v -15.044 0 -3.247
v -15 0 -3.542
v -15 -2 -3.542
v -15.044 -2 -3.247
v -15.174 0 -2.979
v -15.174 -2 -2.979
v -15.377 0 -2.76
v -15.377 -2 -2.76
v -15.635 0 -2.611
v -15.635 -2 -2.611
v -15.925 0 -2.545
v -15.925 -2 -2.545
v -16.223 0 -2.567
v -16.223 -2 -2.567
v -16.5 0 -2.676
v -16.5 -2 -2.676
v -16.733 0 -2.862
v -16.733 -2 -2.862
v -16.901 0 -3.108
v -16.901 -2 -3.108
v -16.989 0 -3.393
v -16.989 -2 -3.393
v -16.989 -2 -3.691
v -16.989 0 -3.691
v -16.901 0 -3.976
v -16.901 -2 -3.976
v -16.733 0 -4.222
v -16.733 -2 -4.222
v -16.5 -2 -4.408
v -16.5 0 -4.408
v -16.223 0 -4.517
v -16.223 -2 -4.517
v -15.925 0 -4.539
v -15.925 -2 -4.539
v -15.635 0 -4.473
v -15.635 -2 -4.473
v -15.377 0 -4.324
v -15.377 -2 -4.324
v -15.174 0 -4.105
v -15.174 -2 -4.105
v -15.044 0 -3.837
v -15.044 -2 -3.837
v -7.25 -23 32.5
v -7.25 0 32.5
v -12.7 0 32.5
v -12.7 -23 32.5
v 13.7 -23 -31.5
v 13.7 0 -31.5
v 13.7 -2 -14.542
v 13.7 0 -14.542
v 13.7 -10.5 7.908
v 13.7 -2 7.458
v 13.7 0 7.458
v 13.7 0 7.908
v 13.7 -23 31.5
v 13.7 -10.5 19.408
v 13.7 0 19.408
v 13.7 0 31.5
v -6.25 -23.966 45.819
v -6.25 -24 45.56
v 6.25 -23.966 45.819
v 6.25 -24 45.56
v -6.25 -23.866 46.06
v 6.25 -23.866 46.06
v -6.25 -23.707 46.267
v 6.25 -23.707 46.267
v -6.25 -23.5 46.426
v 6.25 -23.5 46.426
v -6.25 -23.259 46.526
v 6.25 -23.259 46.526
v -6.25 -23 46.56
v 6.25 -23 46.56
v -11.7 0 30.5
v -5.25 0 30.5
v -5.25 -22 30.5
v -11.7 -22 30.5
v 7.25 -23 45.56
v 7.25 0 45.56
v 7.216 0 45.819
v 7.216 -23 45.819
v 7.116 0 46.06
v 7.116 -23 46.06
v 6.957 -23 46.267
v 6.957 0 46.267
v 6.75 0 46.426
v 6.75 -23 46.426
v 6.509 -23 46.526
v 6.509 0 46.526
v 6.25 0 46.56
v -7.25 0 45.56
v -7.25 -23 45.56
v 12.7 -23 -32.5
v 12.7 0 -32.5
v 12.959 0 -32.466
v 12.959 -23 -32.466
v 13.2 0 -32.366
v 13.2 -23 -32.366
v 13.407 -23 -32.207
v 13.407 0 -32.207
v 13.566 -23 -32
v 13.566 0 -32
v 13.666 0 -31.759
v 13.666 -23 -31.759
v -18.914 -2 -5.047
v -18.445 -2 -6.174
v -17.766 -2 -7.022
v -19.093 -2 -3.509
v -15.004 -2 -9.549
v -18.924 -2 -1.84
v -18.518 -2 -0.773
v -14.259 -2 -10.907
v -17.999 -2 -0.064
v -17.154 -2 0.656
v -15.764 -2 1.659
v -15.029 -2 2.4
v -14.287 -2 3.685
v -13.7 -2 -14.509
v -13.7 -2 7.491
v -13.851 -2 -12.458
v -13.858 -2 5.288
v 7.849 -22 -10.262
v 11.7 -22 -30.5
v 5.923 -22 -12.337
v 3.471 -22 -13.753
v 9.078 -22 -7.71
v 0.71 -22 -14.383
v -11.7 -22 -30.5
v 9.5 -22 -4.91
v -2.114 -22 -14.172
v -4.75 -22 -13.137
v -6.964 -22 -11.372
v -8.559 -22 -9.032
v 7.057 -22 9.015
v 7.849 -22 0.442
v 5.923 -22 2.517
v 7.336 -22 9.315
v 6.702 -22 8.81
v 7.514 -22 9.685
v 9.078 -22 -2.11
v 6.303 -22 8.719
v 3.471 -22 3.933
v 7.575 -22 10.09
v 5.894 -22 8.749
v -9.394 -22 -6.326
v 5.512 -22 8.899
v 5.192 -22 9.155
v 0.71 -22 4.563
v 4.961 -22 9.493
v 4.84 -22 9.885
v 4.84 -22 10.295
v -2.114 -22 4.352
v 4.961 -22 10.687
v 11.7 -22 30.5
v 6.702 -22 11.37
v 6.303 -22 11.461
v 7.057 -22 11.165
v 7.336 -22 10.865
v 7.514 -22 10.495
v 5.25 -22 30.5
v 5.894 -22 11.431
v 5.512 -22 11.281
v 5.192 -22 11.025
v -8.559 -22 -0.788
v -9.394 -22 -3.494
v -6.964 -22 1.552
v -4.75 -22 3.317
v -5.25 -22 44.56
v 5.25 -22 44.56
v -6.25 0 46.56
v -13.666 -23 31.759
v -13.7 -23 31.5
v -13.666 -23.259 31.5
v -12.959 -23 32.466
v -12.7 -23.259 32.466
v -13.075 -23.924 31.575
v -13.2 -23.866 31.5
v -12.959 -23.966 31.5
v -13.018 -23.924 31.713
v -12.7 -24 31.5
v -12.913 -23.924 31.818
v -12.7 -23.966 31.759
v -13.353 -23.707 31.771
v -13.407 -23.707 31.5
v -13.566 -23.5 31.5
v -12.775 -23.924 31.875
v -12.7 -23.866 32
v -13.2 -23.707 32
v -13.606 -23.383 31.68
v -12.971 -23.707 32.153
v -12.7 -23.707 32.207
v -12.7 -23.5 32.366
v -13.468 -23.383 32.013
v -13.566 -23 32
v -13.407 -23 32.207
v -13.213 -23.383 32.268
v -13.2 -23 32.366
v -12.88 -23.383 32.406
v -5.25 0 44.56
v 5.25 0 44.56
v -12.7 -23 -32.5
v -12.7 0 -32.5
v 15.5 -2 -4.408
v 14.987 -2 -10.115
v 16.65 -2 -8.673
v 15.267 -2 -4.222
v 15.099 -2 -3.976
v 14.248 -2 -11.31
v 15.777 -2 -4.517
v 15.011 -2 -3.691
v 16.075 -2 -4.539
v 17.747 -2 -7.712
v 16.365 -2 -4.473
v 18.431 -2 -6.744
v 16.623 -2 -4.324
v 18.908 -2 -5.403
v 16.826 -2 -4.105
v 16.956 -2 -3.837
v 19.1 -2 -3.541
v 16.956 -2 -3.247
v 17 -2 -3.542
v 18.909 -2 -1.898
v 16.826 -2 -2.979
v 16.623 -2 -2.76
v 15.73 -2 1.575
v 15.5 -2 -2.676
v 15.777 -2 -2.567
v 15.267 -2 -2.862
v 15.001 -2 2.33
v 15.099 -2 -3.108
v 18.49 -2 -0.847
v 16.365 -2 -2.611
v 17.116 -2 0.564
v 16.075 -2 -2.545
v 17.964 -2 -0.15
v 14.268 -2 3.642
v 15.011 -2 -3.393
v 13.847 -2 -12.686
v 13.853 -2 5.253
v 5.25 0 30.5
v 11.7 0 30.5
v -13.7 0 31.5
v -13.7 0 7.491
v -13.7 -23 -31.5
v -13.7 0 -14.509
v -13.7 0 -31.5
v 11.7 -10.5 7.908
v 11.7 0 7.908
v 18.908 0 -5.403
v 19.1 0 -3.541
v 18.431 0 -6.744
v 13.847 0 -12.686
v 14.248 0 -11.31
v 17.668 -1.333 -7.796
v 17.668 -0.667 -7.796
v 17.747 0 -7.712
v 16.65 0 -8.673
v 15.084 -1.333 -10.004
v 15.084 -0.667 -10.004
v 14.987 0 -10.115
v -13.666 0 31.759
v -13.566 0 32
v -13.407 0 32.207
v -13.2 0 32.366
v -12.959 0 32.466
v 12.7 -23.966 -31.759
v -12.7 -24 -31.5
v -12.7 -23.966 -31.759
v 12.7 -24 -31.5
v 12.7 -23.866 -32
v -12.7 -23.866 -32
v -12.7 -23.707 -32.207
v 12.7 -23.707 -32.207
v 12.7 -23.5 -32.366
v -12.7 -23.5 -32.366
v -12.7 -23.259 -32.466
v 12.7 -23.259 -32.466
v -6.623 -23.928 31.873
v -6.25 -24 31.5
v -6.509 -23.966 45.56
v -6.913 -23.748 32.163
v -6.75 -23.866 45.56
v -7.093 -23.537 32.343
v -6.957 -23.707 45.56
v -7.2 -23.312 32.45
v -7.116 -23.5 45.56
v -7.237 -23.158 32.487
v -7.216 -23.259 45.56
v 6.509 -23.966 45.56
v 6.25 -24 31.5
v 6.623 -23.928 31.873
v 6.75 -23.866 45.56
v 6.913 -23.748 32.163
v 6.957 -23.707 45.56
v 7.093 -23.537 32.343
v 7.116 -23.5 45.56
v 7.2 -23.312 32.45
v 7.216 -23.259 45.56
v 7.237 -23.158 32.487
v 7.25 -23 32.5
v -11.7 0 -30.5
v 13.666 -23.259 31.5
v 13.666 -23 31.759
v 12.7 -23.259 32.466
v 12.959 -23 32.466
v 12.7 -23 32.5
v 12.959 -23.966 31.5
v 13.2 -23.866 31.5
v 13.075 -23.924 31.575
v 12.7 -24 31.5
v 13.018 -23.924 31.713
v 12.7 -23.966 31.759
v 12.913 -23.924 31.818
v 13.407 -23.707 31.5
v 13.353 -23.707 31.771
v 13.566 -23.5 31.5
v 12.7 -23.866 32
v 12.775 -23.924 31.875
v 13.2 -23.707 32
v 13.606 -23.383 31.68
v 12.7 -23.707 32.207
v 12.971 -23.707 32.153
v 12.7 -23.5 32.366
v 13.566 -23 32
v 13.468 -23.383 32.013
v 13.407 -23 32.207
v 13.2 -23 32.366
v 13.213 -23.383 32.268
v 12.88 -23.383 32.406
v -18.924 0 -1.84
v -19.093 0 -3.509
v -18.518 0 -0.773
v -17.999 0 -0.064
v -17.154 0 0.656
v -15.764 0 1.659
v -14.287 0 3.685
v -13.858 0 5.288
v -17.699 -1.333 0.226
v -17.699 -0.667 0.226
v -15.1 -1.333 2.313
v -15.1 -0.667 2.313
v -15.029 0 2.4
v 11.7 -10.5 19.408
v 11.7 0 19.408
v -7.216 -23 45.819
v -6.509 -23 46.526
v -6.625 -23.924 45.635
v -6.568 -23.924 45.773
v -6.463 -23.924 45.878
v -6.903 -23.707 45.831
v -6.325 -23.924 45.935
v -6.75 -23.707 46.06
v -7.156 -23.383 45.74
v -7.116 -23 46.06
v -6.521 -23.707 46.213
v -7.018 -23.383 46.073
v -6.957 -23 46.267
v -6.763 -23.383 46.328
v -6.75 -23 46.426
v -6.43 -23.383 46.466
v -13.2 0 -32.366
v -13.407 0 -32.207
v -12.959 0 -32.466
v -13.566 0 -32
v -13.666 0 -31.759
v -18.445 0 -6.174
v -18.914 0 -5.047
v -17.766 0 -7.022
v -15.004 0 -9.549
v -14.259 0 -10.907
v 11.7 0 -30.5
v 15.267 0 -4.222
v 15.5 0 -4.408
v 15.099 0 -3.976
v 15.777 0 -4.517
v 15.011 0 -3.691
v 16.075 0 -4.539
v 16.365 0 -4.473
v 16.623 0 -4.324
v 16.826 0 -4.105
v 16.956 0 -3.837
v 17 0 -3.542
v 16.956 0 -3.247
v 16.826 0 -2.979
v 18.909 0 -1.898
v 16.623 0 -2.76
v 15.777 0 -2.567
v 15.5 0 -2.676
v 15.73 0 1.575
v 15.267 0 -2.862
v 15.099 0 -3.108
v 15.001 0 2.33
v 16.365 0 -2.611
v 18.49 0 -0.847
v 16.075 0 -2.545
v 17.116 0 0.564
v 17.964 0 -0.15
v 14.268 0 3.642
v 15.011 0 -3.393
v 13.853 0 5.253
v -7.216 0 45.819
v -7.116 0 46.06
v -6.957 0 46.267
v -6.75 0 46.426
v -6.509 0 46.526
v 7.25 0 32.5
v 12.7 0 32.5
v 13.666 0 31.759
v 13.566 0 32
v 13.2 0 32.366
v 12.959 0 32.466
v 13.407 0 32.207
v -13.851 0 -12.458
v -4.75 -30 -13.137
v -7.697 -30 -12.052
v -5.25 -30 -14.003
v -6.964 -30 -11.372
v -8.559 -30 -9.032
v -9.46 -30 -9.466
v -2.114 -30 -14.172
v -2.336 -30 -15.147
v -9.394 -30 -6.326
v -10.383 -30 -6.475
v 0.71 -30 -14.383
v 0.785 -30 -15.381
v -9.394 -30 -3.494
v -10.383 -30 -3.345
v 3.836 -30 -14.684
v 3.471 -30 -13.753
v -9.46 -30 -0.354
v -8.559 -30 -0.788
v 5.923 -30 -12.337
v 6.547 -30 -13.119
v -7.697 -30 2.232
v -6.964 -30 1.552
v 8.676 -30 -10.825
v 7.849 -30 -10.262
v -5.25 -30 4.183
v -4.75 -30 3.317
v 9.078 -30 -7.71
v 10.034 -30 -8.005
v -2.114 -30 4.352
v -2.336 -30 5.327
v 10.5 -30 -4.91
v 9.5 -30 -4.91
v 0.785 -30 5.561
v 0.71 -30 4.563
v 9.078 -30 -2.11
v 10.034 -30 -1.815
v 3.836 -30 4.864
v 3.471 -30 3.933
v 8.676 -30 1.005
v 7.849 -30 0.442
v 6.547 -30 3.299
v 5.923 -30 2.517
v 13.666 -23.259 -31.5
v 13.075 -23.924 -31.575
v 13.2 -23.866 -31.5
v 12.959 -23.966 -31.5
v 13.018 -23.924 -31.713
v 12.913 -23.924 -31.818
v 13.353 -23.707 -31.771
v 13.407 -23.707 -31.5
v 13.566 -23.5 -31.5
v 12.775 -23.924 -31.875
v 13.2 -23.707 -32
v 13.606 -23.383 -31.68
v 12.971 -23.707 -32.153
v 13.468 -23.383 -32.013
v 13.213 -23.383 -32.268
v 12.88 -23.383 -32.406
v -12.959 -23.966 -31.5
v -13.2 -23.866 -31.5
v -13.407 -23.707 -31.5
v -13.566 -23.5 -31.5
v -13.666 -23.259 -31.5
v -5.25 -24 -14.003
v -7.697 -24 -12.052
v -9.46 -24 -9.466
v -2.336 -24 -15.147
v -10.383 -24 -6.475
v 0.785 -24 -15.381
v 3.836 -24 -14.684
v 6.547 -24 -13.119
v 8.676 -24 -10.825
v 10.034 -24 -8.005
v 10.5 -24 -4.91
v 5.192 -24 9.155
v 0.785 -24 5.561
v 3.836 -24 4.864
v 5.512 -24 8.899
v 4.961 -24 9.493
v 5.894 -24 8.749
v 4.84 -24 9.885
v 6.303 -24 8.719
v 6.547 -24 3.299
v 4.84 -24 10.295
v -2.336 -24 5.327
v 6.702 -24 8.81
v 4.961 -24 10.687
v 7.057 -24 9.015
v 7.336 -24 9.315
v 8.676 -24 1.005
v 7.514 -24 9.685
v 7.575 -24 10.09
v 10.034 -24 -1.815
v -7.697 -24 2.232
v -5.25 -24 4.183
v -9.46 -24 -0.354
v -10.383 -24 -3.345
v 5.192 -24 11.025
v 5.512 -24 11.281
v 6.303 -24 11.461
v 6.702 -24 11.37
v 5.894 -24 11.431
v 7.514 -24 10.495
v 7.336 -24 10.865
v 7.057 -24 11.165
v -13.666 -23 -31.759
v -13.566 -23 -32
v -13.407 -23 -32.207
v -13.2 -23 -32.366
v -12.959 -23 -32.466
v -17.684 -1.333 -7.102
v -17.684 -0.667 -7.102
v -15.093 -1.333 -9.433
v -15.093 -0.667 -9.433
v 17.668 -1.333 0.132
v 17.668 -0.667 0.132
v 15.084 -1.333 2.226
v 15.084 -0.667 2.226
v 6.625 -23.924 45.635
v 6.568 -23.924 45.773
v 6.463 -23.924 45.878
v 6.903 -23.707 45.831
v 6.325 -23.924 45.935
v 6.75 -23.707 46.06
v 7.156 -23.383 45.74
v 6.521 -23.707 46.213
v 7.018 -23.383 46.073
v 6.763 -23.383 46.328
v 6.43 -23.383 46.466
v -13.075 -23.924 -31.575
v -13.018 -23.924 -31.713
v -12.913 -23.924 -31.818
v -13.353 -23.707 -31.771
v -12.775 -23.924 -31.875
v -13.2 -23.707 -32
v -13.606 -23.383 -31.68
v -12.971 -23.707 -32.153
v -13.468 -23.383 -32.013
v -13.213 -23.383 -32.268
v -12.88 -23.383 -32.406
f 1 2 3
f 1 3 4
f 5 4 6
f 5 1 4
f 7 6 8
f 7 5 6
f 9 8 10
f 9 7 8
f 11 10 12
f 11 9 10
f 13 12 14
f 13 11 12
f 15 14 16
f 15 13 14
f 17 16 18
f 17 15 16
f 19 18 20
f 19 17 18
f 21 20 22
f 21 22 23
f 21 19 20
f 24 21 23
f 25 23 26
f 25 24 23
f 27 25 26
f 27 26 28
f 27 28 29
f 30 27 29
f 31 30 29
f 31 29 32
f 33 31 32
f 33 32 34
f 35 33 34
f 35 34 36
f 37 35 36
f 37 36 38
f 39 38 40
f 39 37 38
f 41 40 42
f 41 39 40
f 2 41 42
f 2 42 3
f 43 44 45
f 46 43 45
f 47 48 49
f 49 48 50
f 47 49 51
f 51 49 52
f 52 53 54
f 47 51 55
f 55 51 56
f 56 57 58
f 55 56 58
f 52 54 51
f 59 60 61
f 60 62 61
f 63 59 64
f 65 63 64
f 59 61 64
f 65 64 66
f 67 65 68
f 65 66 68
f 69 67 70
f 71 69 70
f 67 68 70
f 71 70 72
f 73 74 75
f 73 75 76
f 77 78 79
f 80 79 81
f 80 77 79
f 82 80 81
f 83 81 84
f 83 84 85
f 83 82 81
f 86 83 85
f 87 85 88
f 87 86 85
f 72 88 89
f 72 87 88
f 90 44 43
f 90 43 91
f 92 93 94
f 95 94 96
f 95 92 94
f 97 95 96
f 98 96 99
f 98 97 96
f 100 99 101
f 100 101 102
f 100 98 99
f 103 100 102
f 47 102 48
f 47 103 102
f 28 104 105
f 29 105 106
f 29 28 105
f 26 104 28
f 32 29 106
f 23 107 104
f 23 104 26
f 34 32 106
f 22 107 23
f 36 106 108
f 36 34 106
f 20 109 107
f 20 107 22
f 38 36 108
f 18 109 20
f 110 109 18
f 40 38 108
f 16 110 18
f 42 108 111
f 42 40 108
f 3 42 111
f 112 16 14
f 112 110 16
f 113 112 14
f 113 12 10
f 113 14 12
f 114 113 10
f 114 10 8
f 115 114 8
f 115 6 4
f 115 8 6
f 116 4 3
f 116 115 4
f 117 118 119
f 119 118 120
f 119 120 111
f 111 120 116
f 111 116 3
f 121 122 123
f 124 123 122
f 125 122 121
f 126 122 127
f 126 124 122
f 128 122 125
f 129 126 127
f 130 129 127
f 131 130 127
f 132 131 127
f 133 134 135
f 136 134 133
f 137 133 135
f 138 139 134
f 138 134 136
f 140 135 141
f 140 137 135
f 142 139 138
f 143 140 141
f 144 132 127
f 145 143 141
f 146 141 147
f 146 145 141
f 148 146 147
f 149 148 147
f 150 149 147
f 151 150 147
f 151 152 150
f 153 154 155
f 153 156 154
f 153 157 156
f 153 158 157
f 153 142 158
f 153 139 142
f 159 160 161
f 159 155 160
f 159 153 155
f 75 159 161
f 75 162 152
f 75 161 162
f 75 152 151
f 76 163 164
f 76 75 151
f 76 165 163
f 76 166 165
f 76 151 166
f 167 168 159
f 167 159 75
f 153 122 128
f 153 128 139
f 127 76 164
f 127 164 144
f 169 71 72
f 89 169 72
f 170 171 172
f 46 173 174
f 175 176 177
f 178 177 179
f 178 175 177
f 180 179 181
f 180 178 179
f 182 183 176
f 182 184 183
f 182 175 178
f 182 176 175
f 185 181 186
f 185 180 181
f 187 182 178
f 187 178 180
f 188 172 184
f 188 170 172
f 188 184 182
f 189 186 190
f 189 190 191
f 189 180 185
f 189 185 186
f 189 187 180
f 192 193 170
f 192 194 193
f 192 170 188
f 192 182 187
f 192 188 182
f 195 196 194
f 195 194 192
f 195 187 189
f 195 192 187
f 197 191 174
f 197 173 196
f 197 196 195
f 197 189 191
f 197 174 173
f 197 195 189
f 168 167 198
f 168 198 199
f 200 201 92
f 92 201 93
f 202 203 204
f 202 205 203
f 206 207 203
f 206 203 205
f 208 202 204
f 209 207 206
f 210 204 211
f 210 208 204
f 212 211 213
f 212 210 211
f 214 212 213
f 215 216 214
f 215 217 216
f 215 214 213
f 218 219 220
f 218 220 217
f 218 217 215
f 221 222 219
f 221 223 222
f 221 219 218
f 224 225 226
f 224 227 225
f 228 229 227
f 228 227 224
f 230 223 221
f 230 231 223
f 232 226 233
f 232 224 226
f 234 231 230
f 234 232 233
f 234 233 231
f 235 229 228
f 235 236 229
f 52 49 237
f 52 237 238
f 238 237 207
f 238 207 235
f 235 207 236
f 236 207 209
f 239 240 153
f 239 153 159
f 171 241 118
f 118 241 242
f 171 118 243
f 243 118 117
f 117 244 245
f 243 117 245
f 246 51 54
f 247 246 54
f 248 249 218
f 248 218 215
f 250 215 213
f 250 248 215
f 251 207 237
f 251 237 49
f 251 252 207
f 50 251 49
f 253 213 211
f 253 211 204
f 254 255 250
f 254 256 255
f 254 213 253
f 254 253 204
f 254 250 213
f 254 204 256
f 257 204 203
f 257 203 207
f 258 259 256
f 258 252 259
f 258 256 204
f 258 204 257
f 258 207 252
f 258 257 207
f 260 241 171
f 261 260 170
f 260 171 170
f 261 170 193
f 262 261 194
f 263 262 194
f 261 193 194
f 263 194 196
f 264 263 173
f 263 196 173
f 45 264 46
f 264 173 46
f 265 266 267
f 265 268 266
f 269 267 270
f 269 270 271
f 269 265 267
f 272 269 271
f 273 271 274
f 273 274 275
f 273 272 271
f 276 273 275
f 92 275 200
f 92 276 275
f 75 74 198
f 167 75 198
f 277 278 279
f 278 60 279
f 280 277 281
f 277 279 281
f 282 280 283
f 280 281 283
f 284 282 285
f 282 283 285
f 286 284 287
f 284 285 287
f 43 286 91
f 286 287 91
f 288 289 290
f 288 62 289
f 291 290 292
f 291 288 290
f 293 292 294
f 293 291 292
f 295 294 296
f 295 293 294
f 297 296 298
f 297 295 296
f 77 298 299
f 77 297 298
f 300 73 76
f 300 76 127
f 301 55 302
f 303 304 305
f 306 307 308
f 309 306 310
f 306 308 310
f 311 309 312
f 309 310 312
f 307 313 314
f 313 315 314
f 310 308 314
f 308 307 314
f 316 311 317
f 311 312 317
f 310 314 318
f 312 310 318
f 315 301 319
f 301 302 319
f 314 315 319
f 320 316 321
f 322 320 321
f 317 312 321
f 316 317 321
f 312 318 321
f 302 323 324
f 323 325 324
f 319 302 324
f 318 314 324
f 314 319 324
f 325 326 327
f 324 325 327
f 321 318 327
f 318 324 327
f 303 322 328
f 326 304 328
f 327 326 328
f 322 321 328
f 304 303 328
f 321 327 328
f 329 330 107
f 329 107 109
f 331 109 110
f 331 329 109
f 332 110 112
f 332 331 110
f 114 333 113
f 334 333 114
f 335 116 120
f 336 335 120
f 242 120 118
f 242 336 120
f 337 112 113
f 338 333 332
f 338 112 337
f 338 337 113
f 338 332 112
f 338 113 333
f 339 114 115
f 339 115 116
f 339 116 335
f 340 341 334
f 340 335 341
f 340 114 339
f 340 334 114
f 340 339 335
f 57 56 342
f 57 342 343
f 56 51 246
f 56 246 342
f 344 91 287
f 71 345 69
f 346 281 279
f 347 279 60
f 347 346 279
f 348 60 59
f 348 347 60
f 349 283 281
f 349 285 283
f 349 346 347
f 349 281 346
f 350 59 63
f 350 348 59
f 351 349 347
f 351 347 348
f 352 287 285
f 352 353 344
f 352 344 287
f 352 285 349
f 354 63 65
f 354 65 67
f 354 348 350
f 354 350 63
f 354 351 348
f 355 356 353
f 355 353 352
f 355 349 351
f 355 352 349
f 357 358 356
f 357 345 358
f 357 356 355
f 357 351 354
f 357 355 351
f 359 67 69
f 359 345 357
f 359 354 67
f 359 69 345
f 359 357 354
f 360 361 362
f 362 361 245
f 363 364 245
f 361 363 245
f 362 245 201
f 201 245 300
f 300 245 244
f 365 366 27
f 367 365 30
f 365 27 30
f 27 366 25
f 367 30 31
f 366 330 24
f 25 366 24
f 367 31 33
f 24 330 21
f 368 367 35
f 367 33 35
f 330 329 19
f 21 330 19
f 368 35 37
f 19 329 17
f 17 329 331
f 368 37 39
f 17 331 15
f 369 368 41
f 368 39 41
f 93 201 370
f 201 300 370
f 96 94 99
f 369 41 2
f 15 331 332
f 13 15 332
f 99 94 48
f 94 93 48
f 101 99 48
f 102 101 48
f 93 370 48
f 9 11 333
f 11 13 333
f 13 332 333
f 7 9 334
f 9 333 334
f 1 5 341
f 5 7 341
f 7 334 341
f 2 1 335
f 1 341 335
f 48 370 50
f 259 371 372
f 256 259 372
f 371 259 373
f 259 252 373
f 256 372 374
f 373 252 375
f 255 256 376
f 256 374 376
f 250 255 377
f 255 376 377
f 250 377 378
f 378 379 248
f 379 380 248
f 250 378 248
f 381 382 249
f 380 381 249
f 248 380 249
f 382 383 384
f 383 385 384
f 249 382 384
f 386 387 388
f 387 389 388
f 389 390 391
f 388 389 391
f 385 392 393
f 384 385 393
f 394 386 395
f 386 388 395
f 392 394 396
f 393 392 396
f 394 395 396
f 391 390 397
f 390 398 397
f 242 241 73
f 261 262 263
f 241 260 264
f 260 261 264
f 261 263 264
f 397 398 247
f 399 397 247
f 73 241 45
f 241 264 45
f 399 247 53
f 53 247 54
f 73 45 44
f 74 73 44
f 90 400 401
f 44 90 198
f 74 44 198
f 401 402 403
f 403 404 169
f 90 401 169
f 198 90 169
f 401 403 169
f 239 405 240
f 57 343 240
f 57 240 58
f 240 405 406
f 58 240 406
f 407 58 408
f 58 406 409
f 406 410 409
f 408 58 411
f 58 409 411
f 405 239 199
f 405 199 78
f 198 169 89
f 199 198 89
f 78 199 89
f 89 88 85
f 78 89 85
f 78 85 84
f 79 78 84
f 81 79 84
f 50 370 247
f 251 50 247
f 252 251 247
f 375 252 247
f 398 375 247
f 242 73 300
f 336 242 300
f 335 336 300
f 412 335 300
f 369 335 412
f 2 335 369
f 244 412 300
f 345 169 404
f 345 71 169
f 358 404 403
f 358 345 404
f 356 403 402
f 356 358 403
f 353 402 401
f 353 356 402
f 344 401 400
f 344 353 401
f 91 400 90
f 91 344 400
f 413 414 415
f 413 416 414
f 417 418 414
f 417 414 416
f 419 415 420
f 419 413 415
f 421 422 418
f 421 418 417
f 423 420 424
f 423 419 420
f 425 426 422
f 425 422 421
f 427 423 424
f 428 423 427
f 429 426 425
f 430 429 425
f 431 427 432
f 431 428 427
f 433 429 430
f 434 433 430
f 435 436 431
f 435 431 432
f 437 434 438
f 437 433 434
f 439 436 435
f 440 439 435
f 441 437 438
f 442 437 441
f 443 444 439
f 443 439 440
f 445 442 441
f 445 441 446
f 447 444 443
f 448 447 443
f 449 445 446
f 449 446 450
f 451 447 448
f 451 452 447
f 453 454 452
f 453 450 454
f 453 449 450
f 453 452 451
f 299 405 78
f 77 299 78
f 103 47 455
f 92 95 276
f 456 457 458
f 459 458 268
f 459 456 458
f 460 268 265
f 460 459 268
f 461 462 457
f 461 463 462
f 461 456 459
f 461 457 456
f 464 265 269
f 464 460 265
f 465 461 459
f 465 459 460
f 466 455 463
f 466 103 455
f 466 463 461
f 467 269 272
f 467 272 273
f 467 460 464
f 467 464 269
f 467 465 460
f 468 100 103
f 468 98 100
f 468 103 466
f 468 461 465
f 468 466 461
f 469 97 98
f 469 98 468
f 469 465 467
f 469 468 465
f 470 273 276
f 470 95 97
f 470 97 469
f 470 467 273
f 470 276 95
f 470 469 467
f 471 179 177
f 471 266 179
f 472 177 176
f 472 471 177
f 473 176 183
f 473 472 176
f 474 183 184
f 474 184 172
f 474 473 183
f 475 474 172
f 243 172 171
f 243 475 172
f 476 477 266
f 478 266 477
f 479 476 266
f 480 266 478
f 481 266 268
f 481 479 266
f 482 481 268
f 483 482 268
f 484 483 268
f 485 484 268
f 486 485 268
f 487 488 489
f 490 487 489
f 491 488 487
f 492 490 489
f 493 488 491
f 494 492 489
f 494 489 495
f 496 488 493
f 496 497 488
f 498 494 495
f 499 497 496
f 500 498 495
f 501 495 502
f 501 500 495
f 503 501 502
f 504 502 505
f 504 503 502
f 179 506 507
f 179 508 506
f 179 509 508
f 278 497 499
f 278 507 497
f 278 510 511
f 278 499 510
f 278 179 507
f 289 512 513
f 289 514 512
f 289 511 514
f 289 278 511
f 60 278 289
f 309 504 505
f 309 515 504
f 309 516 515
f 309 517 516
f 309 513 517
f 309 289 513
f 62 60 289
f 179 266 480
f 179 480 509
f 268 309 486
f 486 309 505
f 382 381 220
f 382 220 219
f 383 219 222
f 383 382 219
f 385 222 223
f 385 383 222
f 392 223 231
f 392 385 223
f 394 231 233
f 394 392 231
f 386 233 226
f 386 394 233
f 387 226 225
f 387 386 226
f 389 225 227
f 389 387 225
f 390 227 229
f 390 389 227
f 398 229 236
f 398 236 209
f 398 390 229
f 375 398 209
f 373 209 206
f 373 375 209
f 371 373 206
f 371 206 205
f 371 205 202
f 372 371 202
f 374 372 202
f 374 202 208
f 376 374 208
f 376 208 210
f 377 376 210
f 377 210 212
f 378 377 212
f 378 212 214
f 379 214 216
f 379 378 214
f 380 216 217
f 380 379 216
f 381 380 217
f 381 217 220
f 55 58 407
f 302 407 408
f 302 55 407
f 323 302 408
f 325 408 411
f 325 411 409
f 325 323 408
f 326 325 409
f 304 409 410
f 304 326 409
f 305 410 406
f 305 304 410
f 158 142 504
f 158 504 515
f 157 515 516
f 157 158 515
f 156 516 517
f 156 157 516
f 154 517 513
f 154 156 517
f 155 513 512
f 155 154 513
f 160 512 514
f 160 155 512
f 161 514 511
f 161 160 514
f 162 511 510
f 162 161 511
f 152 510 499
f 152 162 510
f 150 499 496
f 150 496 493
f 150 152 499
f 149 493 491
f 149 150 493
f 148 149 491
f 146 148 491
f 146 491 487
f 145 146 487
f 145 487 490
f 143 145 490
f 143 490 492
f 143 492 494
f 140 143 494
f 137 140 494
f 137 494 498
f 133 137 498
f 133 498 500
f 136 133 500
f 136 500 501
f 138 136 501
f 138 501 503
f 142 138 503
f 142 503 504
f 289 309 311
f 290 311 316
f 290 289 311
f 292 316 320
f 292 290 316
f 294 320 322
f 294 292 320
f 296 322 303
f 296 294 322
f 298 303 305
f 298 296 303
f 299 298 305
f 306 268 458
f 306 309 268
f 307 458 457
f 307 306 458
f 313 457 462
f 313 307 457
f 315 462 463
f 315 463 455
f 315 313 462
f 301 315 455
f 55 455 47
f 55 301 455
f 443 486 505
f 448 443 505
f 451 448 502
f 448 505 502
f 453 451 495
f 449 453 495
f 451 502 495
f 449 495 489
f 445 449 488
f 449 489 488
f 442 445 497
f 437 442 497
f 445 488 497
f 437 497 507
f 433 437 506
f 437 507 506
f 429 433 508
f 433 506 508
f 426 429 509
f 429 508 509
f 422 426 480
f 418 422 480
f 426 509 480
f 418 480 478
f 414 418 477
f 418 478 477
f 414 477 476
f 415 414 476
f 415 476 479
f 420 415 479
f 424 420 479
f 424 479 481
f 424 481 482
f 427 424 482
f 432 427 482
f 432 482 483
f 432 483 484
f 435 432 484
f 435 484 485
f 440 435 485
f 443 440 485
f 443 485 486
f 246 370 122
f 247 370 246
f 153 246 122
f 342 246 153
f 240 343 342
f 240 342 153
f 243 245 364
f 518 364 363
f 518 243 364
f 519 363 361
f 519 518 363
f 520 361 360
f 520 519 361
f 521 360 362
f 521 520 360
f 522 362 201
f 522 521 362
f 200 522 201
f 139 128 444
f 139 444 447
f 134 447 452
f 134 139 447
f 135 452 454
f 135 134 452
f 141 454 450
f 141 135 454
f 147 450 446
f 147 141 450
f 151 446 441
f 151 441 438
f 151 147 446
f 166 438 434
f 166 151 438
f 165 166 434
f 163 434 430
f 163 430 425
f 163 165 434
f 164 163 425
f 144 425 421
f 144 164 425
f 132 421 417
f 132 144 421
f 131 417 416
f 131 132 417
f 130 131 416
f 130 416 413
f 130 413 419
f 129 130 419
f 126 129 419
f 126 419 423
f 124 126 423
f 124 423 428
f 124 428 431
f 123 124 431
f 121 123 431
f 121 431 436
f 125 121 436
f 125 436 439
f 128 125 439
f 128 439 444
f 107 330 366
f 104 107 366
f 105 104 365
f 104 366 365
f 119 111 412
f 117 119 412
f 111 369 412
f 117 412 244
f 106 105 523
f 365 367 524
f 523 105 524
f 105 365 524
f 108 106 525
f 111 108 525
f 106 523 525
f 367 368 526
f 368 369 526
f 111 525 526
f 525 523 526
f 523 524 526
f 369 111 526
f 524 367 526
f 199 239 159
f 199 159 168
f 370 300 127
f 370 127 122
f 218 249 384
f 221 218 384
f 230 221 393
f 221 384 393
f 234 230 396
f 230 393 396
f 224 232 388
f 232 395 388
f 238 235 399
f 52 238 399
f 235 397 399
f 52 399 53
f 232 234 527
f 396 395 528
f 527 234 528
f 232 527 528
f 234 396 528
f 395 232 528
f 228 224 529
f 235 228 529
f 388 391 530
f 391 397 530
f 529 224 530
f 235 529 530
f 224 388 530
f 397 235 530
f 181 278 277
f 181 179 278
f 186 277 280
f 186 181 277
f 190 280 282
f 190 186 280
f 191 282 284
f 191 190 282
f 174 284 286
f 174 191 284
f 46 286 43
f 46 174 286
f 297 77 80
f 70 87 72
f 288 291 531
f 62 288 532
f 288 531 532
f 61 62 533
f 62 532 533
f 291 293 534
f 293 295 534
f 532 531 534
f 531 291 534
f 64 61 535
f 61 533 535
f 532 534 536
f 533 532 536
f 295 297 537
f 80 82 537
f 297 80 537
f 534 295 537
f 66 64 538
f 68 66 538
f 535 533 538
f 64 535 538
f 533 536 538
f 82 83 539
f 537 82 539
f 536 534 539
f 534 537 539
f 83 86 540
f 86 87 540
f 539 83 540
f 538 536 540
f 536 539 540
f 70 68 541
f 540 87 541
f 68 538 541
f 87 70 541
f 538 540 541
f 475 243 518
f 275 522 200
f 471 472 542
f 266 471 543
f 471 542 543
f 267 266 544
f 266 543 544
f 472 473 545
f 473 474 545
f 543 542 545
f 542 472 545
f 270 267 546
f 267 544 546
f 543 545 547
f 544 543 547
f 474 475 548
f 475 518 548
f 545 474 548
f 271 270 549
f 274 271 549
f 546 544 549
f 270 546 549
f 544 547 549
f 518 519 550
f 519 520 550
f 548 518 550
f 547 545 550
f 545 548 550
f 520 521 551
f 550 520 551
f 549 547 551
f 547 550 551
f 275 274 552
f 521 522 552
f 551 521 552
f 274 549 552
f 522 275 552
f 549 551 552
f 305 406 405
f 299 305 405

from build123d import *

# Parameters (mm, degrees)
F0_R        = 10.5
F0_R_2      = 1.375
F0_W        = 14.5
F0_H        = 14.06
F1_DEPTH    = 24
F2_T        = 2
F2_T3_DEPTH = 28
F0_R_3      = 9.5
F3_DEPTH    = 30
F0_R_4      = 1
F4_DEPTH    = 2
F5_R        = 1
F6_R        = 3.375
F7_DEPTH    = 22
F9_DEPTH    = 22
F10_W       = 10.5
F10_H       = 11.5
F11_DEPTH   = 2


# Not quite as in the source:
# - an extrude ends at something that could not be found from the text; its depth is read off the source's solid
# - a shell that OpenCascade refuses in one call is made with other operations: the cavity is built on its own and cut out


with BuildPart() as f1:
    # F0 (on Front) → F1 (new body)
    with BuildSketch(Plane.XZ):
        Polygon((-7.25, 32.5), (-13.7, 32.5), (-13.7, 7.4914984291), (-13.7, -14.5085015709), (-13.7, -32.5), (13.7, -32.5), (13.7, -14.5420665913), (13.7, 7.4579334087), (13.7, 32.5), (7.25, 32.5), align=None)
        with Locations((0, -4.91)):
            Circle(F0_R, mode=Mode.SUBTRACT)
        with Locations((6.2, 10.09)):
            Circle(F0_R_2, mode=Mode.SUBTRACT)
        with Locations((0, 39.53)):
            Rectangle(F0_W, F0_H)
    extrude(amount=F1_DEPTH)

    # F2: shell of thickness 2, made by hand


with BuildPart() as f2_core1:
    # F2_t2: copy of F1
    add(f1.part)

    # the walls: a layer under each face that stays
    f2_faces = [f2_core1.faces().sort_by_distance(p)[0] for p in [
        (-10.475, -12, 32.5),
        (-13.7, -12, 0),
        (0, -12, -32.5),
        (13.7, -12, 0),
        (10.475, -12, 32.5),
        (7.25, -12, 39.53),
        (0, -12, 46.56),
        (-7.25, -12, 39.53),
        (-10.5, -12, -4.91),
        (4.825, -12, 10.09),
        (0, -24, 7.03),
    ]]
    thicken(f2_faces, amount=-F2_T, mode=Mode.SUBTRACT)

    # F2_s4 → F2_t3 (cut)
    with BuildSketch(Plane.XZ.offset(-2)):
        Polygon((-7.27, 32.52), (-7.25, 30.5), (-5.25, 30.5), (-5.25, 32.5), align=None)
        Polygon((7.27, 32.52), (7.25, 30.5), (5.25, 30.5), (5.25, 32.5), align=None)
    extrude(amount=F2_T3_DEPTH, mode=Mode.SUBTRACT)


with BuildPart() as f1_1:
    add(f1.part)

    # what is left inside the walls is the cavity
    f2_cavity = [f2_core1.part.solids().sort_by_distance(p)[0] for p in [
        (0, -0.02, 14.513333),
        (0, -14.666667, -17.43),
    ]]
    add(f2_cavity, mode=Mode.SUBTRACT)

    # F0 (on Front) → F3 (join)
    with BuildSketch(Plane.XZ):
        with Locations((0, -4.91)):
            Circle(F0_R)
        with Locations((0, -4.91)):
            Circle(F0_R_3, mode=Mode.SUBTRACT)
    extrude(amount=F3_DEPTH)

    # F0 (on Front) → F4 (join)
    with BuildSketch(Plane.XZ):
        with BuildLine():
            Line((-13.7, -14.5085015709), (-13.7, 7.4914984291))
            add(Edge.make_bspline(
                [(-19.093351697, -3.5085015709), (-19.1026122295, 2.6293974578), (-13.7, -0.8116166133), (-13.7, 7.4914984291)],
                knots=[0, 0, 0, 0, 12.2510506704, 12.2510506704, 12.2510506704, 12.2510506704], degree=3))
            add(Edge.make_bspline(
                [(-19.093351697, -3.5085015709), (-19.0674920552, -9.0708802246), (-13.7, -6.7231292221), (-13.7, -14.5085015709)],
                knots=[0, 0, 0, 0, 12.2510506704, 12.2510506704, 12.2510506704, 12.2510506704], degree=3))
        make_face()
        with Locations((-16, -3.5420665913)):
            Circle(F0_R_4, mode=Mode.SUBTRACT)
        with BuildLine():
            add(Edge.make_bspline(
                [(19.0999998349, -3.5410547692), (19.0290823921, 2.4940823569), (13.7, -0.9160112299), (13.7, 7.4579334087)],
                knots=[0, 0, 0, 0, 12.2530706011, 12.2530706011, 12.2530706011, 12.2530706011], degree=3))
            Line((13.7, 7.4579334087), (13.7, -14.5420665913))
            add(Edge.make_bspline(
                [(19.0999998349, -3.5410547692), (19.0287452534, -10.2770104641), (13.7, -7.3807572052), (13.7, -14.5420665913)],
                knots=[0, 0, 0, 0, 12.2548871608, 12.2548871608, 12.2548871608, 12.2548871608], degree=3))
        make_face()
        with Locations((16, -3.5420665913)):
            Circle(F0_R_4, mode=Mode.SUBTRACT)
    extrude(amount=F4_DEPTH)

    # F5
    f5_edges = [f1_1.edges().sort_by_distance(p)[0] for p in [
        (13.7, -12, 32.5),
        (-13.7, -12, 32.5),
        (-13.7, -12, -32.5),
        (13.7, -12, -32.5),
        (7.25, -12, 46.56),
        (-7.25, -12, 46.56),
        (7.25, -24, 39.53),
        (-7.25, -24, 39.53),
        (-13.7, -24, 0),
        (13.7, -24, 0),
        (0, -24, -32.5),
        (-10.475, -24, 32.5),
        (10.475, -24, 32.5),
        (0, -24, 46.56),
    ]]
    fillet(f5_edges, radius=F5_R)

    # F6 (on face) → F7 (cut, through all)
    with BuildSketch(Plane(origin=(0, 0, 0), x_dir=(-1, 0, 0), z_dir=(0, 1, 0))):
        with Locations((-6.2, 10.09)):
            Circle(F6_R)
    extrude(amount=-F7_DEPTH, mode=Mode.SUBTRACT)

    # F8 (on face) → F9 (cut, through all)
    with BuildSketch(Plane(origin=(0, 0, 0), x_dir=(-1, 0, 0), z_dir=(0, 1, 0))):
        with BuildLine():
            ThreePointArc((-11.7, -9.31), (0, -17.41), (11.7, -9.31))
            Line((11.7, -9.31), (11.7, -0.51))
            ThreePointArc((11.7, -0.51), (0, 7.59), (-11.7, -0.51))
            Line((-11.7, -0.51), (-11.7, -9.31))
        make_face()
    extrude(amount=-F9_DEPTH, mode=Mode.SUBTRACT)

    # F10 (on face) → F11 (cut, through all)
    with BuildSketch(Plane.YZ.offset(13.7)):
        with Locations((-5.25, 13.6579334087)):
            Rectangle(F10_W, F10_H)
    extrude(amount=-F11_DEPTH, mode=Mode.SUBTRACT)


solid = f1_1.part
